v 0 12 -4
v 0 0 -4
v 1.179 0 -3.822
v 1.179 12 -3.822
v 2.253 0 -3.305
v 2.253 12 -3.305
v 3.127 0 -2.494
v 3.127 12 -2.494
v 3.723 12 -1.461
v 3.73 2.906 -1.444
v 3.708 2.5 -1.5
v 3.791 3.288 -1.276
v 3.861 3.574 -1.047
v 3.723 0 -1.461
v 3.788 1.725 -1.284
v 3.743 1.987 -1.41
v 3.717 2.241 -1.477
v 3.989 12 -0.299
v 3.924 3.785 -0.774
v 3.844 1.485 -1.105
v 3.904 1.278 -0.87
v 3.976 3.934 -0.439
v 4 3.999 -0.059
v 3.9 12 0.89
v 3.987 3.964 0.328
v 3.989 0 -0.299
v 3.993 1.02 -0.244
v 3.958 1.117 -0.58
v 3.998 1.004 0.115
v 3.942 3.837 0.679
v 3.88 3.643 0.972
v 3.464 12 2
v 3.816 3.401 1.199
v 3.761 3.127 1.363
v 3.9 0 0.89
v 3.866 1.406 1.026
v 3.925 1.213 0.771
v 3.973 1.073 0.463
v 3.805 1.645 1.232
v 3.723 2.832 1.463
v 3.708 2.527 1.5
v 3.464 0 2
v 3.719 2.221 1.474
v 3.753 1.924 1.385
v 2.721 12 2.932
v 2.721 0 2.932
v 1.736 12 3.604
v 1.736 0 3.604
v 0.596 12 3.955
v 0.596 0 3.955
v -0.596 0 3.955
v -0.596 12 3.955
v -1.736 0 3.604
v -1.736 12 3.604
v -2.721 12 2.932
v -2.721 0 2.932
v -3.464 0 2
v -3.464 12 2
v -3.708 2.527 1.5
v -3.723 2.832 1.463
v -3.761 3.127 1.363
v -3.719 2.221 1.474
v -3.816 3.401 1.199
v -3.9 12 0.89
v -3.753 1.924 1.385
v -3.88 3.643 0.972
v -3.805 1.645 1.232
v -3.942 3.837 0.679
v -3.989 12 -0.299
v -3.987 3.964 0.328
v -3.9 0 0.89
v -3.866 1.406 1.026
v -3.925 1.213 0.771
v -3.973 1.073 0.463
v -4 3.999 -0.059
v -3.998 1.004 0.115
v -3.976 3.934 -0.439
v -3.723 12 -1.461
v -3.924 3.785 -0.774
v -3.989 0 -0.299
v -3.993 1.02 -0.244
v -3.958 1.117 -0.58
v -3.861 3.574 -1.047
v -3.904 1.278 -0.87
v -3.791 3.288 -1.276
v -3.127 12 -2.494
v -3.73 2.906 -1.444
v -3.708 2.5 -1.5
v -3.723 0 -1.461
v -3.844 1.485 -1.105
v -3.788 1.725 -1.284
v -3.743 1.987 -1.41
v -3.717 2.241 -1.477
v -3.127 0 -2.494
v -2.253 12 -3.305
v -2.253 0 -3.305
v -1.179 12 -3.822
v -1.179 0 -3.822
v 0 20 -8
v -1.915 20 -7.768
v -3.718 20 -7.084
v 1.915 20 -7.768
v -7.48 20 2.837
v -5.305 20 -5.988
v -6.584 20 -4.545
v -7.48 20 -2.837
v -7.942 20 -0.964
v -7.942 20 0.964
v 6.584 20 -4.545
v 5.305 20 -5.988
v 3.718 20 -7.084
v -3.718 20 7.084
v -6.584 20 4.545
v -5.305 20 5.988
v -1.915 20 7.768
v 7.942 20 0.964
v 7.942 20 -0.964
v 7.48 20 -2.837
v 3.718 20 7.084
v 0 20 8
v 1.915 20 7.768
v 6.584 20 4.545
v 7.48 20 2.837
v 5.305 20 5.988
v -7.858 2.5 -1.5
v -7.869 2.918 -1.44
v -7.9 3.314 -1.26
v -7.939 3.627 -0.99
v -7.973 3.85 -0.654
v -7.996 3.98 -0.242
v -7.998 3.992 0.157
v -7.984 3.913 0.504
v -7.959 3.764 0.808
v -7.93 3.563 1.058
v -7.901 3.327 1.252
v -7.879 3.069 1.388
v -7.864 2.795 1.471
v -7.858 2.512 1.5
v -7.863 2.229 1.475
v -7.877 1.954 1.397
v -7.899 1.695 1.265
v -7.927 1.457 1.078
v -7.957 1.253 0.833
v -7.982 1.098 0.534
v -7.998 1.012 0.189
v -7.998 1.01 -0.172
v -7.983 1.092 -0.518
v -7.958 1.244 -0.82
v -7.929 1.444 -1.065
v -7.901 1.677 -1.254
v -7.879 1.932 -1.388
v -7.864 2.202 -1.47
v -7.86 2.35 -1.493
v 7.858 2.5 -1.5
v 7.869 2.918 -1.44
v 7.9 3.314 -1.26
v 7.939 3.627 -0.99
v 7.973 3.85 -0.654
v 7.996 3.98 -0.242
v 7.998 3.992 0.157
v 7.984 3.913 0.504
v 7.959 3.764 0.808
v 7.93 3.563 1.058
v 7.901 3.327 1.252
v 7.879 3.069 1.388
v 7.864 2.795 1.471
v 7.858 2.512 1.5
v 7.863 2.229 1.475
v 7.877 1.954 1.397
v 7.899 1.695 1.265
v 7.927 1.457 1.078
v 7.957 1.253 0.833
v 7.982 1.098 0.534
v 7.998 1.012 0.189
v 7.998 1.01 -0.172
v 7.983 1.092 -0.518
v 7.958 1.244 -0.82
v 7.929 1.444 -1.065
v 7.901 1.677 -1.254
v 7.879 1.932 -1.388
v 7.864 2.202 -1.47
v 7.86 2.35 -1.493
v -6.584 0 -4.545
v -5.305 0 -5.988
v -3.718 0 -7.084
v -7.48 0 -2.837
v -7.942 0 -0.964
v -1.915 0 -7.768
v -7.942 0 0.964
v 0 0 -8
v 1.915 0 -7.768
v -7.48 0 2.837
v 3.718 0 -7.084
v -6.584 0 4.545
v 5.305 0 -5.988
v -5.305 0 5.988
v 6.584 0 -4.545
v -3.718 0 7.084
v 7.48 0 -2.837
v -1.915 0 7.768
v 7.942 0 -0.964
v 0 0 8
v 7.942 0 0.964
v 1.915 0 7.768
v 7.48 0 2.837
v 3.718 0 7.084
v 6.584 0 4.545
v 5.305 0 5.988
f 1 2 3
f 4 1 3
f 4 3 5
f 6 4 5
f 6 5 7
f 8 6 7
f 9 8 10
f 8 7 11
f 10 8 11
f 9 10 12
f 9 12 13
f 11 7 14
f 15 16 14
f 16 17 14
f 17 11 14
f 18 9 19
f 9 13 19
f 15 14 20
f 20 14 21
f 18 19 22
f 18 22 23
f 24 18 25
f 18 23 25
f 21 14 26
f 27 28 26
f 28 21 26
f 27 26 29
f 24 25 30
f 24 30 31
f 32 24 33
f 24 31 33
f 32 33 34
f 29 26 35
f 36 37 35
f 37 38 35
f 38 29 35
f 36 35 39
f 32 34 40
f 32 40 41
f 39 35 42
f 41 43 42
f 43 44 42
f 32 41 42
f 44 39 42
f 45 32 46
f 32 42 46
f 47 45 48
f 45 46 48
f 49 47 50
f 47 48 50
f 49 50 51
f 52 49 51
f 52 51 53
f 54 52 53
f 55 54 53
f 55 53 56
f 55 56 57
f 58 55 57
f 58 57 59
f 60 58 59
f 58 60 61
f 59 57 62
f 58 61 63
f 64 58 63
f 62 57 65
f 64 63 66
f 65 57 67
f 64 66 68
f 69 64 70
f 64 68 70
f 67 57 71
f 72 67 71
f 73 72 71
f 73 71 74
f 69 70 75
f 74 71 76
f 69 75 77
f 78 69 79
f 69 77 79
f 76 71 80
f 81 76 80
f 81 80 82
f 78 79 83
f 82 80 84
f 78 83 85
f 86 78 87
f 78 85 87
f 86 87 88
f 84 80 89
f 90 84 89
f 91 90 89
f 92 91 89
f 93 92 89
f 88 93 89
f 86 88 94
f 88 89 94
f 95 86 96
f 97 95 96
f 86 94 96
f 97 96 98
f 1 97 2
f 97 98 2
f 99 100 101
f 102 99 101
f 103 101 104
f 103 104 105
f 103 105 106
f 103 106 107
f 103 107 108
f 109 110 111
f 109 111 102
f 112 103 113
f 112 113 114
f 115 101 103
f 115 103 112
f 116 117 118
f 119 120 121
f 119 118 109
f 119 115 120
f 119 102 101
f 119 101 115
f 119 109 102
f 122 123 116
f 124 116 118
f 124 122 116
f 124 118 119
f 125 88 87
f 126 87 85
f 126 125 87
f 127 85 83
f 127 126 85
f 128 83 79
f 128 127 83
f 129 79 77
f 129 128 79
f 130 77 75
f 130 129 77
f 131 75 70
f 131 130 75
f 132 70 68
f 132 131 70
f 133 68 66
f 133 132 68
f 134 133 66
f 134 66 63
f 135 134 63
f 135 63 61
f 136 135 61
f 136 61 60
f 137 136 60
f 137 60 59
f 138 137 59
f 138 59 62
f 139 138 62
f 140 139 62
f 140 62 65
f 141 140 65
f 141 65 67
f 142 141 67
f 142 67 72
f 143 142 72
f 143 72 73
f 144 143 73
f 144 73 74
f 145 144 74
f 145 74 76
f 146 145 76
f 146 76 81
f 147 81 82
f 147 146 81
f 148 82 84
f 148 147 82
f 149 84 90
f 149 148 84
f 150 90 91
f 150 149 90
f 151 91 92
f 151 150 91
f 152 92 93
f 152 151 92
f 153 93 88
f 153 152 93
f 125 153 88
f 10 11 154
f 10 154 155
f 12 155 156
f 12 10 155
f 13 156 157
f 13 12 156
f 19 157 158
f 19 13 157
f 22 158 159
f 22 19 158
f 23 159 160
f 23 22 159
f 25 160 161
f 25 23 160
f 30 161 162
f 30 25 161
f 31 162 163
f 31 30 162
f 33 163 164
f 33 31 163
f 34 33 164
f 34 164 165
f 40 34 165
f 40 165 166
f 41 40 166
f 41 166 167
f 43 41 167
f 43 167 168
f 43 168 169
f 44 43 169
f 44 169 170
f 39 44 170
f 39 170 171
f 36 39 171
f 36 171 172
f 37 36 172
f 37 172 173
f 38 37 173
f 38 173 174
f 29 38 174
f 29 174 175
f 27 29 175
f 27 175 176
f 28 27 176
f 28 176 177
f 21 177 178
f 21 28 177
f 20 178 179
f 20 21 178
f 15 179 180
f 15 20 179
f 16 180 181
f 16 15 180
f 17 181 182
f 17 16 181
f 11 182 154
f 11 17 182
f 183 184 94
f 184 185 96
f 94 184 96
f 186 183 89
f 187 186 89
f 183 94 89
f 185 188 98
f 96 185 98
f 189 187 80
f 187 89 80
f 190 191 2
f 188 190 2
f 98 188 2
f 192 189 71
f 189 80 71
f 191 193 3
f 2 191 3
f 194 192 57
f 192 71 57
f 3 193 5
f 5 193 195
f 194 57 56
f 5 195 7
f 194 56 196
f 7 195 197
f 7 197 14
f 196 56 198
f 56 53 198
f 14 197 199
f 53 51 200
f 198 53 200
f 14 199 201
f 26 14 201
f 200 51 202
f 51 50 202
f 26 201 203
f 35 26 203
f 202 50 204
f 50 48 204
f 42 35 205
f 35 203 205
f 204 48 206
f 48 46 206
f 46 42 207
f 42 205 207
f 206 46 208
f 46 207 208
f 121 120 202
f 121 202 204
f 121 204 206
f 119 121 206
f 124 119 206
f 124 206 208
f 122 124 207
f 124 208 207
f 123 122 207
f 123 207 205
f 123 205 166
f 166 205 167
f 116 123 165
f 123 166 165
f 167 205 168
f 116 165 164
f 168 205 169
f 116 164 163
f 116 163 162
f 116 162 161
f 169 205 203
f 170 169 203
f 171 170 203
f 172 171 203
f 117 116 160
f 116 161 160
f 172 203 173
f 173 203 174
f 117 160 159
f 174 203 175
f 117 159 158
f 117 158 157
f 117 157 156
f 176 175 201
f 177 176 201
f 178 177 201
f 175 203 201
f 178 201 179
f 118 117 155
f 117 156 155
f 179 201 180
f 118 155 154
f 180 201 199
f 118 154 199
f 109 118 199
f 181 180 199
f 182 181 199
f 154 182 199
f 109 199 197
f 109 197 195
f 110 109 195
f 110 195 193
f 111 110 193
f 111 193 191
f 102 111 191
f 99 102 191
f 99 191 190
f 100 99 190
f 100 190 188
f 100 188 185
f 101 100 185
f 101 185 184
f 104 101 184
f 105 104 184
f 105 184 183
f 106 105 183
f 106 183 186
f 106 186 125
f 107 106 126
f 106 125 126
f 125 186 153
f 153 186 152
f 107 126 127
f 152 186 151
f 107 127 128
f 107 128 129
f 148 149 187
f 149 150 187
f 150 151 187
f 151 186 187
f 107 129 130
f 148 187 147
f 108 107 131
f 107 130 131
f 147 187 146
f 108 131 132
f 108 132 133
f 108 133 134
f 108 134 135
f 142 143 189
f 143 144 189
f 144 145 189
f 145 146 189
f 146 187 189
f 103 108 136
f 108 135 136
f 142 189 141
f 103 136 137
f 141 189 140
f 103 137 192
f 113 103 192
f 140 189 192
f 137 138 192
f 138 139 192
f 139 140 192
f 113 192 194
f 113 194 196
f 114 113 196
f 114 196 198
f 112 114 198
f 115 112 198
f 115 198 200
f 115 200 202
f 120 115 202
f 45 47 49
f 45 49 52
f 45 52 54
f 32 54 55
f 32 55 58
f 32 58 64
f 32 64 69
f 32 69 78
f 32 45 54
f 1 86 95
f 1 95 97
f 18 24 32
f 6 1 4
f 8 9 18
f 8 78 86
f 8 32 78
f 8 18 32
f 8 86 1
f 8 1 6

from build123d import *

# Parameters (mm, degrees)
SKETCH3_R               = 8
BOSS_EXTRUDE1_DEPTH     = 20
SKETCH4_R               = 4
CUT_EXTRUDE1_DEPTH      = 12
CUT_EXTRUDE2_DEPTH      = 23.978250586
CUT_EXTRUDE2_DEPTH_BACK = 23.978250586
SKETCH5_R               = 1.5


with BuildPart() as part:
    # Sketch3 → Boss-Extrude1 (new body)
    with BuildSketch(Plane(origin=(0, 0, 0), x_dir=(1, 0, 0), z_dir=(0, 1, 0))):
        with Locations(Location((0, 0, 0), (0, 0, 270))):
            Circle(SKETCH3_R)
    extrude(amount=BOSS_EXTRUDE1_DEPTH)

    # Sketch4 → Cut-Extrude1 (cut)
    with BuildSketch(Plane.XZ):
        with Locations(Location((0, 0, 0), (0, 0, 270))):
            Circle(SKETCH4_R)
    extrude(amount=-CUT_EXTRUDE1_DEPTH, mode=Mode.SUBTRACT)

    # Sketch5 → Cut-Extrude2 (cut, two sides: drawn at the far end of the back side and taken through both)
    with BuildSketch(Plane(origin=(0, 0, 0), x_dir=(0, 0, -1), z_dir=(1, 0, 0)).offset(-CUT_EXTRUDE2_DEPTH_BACK)):
        with Locations((0, 2.5)):
            Circle(SKETCH5_R)
    extrude(amount=CUT_EXTRUDE2_DEPTH + CUT_EXTRUDE2_DEPTH_BACK, mode=Mode.SUBTRACT)


solid = part.part
